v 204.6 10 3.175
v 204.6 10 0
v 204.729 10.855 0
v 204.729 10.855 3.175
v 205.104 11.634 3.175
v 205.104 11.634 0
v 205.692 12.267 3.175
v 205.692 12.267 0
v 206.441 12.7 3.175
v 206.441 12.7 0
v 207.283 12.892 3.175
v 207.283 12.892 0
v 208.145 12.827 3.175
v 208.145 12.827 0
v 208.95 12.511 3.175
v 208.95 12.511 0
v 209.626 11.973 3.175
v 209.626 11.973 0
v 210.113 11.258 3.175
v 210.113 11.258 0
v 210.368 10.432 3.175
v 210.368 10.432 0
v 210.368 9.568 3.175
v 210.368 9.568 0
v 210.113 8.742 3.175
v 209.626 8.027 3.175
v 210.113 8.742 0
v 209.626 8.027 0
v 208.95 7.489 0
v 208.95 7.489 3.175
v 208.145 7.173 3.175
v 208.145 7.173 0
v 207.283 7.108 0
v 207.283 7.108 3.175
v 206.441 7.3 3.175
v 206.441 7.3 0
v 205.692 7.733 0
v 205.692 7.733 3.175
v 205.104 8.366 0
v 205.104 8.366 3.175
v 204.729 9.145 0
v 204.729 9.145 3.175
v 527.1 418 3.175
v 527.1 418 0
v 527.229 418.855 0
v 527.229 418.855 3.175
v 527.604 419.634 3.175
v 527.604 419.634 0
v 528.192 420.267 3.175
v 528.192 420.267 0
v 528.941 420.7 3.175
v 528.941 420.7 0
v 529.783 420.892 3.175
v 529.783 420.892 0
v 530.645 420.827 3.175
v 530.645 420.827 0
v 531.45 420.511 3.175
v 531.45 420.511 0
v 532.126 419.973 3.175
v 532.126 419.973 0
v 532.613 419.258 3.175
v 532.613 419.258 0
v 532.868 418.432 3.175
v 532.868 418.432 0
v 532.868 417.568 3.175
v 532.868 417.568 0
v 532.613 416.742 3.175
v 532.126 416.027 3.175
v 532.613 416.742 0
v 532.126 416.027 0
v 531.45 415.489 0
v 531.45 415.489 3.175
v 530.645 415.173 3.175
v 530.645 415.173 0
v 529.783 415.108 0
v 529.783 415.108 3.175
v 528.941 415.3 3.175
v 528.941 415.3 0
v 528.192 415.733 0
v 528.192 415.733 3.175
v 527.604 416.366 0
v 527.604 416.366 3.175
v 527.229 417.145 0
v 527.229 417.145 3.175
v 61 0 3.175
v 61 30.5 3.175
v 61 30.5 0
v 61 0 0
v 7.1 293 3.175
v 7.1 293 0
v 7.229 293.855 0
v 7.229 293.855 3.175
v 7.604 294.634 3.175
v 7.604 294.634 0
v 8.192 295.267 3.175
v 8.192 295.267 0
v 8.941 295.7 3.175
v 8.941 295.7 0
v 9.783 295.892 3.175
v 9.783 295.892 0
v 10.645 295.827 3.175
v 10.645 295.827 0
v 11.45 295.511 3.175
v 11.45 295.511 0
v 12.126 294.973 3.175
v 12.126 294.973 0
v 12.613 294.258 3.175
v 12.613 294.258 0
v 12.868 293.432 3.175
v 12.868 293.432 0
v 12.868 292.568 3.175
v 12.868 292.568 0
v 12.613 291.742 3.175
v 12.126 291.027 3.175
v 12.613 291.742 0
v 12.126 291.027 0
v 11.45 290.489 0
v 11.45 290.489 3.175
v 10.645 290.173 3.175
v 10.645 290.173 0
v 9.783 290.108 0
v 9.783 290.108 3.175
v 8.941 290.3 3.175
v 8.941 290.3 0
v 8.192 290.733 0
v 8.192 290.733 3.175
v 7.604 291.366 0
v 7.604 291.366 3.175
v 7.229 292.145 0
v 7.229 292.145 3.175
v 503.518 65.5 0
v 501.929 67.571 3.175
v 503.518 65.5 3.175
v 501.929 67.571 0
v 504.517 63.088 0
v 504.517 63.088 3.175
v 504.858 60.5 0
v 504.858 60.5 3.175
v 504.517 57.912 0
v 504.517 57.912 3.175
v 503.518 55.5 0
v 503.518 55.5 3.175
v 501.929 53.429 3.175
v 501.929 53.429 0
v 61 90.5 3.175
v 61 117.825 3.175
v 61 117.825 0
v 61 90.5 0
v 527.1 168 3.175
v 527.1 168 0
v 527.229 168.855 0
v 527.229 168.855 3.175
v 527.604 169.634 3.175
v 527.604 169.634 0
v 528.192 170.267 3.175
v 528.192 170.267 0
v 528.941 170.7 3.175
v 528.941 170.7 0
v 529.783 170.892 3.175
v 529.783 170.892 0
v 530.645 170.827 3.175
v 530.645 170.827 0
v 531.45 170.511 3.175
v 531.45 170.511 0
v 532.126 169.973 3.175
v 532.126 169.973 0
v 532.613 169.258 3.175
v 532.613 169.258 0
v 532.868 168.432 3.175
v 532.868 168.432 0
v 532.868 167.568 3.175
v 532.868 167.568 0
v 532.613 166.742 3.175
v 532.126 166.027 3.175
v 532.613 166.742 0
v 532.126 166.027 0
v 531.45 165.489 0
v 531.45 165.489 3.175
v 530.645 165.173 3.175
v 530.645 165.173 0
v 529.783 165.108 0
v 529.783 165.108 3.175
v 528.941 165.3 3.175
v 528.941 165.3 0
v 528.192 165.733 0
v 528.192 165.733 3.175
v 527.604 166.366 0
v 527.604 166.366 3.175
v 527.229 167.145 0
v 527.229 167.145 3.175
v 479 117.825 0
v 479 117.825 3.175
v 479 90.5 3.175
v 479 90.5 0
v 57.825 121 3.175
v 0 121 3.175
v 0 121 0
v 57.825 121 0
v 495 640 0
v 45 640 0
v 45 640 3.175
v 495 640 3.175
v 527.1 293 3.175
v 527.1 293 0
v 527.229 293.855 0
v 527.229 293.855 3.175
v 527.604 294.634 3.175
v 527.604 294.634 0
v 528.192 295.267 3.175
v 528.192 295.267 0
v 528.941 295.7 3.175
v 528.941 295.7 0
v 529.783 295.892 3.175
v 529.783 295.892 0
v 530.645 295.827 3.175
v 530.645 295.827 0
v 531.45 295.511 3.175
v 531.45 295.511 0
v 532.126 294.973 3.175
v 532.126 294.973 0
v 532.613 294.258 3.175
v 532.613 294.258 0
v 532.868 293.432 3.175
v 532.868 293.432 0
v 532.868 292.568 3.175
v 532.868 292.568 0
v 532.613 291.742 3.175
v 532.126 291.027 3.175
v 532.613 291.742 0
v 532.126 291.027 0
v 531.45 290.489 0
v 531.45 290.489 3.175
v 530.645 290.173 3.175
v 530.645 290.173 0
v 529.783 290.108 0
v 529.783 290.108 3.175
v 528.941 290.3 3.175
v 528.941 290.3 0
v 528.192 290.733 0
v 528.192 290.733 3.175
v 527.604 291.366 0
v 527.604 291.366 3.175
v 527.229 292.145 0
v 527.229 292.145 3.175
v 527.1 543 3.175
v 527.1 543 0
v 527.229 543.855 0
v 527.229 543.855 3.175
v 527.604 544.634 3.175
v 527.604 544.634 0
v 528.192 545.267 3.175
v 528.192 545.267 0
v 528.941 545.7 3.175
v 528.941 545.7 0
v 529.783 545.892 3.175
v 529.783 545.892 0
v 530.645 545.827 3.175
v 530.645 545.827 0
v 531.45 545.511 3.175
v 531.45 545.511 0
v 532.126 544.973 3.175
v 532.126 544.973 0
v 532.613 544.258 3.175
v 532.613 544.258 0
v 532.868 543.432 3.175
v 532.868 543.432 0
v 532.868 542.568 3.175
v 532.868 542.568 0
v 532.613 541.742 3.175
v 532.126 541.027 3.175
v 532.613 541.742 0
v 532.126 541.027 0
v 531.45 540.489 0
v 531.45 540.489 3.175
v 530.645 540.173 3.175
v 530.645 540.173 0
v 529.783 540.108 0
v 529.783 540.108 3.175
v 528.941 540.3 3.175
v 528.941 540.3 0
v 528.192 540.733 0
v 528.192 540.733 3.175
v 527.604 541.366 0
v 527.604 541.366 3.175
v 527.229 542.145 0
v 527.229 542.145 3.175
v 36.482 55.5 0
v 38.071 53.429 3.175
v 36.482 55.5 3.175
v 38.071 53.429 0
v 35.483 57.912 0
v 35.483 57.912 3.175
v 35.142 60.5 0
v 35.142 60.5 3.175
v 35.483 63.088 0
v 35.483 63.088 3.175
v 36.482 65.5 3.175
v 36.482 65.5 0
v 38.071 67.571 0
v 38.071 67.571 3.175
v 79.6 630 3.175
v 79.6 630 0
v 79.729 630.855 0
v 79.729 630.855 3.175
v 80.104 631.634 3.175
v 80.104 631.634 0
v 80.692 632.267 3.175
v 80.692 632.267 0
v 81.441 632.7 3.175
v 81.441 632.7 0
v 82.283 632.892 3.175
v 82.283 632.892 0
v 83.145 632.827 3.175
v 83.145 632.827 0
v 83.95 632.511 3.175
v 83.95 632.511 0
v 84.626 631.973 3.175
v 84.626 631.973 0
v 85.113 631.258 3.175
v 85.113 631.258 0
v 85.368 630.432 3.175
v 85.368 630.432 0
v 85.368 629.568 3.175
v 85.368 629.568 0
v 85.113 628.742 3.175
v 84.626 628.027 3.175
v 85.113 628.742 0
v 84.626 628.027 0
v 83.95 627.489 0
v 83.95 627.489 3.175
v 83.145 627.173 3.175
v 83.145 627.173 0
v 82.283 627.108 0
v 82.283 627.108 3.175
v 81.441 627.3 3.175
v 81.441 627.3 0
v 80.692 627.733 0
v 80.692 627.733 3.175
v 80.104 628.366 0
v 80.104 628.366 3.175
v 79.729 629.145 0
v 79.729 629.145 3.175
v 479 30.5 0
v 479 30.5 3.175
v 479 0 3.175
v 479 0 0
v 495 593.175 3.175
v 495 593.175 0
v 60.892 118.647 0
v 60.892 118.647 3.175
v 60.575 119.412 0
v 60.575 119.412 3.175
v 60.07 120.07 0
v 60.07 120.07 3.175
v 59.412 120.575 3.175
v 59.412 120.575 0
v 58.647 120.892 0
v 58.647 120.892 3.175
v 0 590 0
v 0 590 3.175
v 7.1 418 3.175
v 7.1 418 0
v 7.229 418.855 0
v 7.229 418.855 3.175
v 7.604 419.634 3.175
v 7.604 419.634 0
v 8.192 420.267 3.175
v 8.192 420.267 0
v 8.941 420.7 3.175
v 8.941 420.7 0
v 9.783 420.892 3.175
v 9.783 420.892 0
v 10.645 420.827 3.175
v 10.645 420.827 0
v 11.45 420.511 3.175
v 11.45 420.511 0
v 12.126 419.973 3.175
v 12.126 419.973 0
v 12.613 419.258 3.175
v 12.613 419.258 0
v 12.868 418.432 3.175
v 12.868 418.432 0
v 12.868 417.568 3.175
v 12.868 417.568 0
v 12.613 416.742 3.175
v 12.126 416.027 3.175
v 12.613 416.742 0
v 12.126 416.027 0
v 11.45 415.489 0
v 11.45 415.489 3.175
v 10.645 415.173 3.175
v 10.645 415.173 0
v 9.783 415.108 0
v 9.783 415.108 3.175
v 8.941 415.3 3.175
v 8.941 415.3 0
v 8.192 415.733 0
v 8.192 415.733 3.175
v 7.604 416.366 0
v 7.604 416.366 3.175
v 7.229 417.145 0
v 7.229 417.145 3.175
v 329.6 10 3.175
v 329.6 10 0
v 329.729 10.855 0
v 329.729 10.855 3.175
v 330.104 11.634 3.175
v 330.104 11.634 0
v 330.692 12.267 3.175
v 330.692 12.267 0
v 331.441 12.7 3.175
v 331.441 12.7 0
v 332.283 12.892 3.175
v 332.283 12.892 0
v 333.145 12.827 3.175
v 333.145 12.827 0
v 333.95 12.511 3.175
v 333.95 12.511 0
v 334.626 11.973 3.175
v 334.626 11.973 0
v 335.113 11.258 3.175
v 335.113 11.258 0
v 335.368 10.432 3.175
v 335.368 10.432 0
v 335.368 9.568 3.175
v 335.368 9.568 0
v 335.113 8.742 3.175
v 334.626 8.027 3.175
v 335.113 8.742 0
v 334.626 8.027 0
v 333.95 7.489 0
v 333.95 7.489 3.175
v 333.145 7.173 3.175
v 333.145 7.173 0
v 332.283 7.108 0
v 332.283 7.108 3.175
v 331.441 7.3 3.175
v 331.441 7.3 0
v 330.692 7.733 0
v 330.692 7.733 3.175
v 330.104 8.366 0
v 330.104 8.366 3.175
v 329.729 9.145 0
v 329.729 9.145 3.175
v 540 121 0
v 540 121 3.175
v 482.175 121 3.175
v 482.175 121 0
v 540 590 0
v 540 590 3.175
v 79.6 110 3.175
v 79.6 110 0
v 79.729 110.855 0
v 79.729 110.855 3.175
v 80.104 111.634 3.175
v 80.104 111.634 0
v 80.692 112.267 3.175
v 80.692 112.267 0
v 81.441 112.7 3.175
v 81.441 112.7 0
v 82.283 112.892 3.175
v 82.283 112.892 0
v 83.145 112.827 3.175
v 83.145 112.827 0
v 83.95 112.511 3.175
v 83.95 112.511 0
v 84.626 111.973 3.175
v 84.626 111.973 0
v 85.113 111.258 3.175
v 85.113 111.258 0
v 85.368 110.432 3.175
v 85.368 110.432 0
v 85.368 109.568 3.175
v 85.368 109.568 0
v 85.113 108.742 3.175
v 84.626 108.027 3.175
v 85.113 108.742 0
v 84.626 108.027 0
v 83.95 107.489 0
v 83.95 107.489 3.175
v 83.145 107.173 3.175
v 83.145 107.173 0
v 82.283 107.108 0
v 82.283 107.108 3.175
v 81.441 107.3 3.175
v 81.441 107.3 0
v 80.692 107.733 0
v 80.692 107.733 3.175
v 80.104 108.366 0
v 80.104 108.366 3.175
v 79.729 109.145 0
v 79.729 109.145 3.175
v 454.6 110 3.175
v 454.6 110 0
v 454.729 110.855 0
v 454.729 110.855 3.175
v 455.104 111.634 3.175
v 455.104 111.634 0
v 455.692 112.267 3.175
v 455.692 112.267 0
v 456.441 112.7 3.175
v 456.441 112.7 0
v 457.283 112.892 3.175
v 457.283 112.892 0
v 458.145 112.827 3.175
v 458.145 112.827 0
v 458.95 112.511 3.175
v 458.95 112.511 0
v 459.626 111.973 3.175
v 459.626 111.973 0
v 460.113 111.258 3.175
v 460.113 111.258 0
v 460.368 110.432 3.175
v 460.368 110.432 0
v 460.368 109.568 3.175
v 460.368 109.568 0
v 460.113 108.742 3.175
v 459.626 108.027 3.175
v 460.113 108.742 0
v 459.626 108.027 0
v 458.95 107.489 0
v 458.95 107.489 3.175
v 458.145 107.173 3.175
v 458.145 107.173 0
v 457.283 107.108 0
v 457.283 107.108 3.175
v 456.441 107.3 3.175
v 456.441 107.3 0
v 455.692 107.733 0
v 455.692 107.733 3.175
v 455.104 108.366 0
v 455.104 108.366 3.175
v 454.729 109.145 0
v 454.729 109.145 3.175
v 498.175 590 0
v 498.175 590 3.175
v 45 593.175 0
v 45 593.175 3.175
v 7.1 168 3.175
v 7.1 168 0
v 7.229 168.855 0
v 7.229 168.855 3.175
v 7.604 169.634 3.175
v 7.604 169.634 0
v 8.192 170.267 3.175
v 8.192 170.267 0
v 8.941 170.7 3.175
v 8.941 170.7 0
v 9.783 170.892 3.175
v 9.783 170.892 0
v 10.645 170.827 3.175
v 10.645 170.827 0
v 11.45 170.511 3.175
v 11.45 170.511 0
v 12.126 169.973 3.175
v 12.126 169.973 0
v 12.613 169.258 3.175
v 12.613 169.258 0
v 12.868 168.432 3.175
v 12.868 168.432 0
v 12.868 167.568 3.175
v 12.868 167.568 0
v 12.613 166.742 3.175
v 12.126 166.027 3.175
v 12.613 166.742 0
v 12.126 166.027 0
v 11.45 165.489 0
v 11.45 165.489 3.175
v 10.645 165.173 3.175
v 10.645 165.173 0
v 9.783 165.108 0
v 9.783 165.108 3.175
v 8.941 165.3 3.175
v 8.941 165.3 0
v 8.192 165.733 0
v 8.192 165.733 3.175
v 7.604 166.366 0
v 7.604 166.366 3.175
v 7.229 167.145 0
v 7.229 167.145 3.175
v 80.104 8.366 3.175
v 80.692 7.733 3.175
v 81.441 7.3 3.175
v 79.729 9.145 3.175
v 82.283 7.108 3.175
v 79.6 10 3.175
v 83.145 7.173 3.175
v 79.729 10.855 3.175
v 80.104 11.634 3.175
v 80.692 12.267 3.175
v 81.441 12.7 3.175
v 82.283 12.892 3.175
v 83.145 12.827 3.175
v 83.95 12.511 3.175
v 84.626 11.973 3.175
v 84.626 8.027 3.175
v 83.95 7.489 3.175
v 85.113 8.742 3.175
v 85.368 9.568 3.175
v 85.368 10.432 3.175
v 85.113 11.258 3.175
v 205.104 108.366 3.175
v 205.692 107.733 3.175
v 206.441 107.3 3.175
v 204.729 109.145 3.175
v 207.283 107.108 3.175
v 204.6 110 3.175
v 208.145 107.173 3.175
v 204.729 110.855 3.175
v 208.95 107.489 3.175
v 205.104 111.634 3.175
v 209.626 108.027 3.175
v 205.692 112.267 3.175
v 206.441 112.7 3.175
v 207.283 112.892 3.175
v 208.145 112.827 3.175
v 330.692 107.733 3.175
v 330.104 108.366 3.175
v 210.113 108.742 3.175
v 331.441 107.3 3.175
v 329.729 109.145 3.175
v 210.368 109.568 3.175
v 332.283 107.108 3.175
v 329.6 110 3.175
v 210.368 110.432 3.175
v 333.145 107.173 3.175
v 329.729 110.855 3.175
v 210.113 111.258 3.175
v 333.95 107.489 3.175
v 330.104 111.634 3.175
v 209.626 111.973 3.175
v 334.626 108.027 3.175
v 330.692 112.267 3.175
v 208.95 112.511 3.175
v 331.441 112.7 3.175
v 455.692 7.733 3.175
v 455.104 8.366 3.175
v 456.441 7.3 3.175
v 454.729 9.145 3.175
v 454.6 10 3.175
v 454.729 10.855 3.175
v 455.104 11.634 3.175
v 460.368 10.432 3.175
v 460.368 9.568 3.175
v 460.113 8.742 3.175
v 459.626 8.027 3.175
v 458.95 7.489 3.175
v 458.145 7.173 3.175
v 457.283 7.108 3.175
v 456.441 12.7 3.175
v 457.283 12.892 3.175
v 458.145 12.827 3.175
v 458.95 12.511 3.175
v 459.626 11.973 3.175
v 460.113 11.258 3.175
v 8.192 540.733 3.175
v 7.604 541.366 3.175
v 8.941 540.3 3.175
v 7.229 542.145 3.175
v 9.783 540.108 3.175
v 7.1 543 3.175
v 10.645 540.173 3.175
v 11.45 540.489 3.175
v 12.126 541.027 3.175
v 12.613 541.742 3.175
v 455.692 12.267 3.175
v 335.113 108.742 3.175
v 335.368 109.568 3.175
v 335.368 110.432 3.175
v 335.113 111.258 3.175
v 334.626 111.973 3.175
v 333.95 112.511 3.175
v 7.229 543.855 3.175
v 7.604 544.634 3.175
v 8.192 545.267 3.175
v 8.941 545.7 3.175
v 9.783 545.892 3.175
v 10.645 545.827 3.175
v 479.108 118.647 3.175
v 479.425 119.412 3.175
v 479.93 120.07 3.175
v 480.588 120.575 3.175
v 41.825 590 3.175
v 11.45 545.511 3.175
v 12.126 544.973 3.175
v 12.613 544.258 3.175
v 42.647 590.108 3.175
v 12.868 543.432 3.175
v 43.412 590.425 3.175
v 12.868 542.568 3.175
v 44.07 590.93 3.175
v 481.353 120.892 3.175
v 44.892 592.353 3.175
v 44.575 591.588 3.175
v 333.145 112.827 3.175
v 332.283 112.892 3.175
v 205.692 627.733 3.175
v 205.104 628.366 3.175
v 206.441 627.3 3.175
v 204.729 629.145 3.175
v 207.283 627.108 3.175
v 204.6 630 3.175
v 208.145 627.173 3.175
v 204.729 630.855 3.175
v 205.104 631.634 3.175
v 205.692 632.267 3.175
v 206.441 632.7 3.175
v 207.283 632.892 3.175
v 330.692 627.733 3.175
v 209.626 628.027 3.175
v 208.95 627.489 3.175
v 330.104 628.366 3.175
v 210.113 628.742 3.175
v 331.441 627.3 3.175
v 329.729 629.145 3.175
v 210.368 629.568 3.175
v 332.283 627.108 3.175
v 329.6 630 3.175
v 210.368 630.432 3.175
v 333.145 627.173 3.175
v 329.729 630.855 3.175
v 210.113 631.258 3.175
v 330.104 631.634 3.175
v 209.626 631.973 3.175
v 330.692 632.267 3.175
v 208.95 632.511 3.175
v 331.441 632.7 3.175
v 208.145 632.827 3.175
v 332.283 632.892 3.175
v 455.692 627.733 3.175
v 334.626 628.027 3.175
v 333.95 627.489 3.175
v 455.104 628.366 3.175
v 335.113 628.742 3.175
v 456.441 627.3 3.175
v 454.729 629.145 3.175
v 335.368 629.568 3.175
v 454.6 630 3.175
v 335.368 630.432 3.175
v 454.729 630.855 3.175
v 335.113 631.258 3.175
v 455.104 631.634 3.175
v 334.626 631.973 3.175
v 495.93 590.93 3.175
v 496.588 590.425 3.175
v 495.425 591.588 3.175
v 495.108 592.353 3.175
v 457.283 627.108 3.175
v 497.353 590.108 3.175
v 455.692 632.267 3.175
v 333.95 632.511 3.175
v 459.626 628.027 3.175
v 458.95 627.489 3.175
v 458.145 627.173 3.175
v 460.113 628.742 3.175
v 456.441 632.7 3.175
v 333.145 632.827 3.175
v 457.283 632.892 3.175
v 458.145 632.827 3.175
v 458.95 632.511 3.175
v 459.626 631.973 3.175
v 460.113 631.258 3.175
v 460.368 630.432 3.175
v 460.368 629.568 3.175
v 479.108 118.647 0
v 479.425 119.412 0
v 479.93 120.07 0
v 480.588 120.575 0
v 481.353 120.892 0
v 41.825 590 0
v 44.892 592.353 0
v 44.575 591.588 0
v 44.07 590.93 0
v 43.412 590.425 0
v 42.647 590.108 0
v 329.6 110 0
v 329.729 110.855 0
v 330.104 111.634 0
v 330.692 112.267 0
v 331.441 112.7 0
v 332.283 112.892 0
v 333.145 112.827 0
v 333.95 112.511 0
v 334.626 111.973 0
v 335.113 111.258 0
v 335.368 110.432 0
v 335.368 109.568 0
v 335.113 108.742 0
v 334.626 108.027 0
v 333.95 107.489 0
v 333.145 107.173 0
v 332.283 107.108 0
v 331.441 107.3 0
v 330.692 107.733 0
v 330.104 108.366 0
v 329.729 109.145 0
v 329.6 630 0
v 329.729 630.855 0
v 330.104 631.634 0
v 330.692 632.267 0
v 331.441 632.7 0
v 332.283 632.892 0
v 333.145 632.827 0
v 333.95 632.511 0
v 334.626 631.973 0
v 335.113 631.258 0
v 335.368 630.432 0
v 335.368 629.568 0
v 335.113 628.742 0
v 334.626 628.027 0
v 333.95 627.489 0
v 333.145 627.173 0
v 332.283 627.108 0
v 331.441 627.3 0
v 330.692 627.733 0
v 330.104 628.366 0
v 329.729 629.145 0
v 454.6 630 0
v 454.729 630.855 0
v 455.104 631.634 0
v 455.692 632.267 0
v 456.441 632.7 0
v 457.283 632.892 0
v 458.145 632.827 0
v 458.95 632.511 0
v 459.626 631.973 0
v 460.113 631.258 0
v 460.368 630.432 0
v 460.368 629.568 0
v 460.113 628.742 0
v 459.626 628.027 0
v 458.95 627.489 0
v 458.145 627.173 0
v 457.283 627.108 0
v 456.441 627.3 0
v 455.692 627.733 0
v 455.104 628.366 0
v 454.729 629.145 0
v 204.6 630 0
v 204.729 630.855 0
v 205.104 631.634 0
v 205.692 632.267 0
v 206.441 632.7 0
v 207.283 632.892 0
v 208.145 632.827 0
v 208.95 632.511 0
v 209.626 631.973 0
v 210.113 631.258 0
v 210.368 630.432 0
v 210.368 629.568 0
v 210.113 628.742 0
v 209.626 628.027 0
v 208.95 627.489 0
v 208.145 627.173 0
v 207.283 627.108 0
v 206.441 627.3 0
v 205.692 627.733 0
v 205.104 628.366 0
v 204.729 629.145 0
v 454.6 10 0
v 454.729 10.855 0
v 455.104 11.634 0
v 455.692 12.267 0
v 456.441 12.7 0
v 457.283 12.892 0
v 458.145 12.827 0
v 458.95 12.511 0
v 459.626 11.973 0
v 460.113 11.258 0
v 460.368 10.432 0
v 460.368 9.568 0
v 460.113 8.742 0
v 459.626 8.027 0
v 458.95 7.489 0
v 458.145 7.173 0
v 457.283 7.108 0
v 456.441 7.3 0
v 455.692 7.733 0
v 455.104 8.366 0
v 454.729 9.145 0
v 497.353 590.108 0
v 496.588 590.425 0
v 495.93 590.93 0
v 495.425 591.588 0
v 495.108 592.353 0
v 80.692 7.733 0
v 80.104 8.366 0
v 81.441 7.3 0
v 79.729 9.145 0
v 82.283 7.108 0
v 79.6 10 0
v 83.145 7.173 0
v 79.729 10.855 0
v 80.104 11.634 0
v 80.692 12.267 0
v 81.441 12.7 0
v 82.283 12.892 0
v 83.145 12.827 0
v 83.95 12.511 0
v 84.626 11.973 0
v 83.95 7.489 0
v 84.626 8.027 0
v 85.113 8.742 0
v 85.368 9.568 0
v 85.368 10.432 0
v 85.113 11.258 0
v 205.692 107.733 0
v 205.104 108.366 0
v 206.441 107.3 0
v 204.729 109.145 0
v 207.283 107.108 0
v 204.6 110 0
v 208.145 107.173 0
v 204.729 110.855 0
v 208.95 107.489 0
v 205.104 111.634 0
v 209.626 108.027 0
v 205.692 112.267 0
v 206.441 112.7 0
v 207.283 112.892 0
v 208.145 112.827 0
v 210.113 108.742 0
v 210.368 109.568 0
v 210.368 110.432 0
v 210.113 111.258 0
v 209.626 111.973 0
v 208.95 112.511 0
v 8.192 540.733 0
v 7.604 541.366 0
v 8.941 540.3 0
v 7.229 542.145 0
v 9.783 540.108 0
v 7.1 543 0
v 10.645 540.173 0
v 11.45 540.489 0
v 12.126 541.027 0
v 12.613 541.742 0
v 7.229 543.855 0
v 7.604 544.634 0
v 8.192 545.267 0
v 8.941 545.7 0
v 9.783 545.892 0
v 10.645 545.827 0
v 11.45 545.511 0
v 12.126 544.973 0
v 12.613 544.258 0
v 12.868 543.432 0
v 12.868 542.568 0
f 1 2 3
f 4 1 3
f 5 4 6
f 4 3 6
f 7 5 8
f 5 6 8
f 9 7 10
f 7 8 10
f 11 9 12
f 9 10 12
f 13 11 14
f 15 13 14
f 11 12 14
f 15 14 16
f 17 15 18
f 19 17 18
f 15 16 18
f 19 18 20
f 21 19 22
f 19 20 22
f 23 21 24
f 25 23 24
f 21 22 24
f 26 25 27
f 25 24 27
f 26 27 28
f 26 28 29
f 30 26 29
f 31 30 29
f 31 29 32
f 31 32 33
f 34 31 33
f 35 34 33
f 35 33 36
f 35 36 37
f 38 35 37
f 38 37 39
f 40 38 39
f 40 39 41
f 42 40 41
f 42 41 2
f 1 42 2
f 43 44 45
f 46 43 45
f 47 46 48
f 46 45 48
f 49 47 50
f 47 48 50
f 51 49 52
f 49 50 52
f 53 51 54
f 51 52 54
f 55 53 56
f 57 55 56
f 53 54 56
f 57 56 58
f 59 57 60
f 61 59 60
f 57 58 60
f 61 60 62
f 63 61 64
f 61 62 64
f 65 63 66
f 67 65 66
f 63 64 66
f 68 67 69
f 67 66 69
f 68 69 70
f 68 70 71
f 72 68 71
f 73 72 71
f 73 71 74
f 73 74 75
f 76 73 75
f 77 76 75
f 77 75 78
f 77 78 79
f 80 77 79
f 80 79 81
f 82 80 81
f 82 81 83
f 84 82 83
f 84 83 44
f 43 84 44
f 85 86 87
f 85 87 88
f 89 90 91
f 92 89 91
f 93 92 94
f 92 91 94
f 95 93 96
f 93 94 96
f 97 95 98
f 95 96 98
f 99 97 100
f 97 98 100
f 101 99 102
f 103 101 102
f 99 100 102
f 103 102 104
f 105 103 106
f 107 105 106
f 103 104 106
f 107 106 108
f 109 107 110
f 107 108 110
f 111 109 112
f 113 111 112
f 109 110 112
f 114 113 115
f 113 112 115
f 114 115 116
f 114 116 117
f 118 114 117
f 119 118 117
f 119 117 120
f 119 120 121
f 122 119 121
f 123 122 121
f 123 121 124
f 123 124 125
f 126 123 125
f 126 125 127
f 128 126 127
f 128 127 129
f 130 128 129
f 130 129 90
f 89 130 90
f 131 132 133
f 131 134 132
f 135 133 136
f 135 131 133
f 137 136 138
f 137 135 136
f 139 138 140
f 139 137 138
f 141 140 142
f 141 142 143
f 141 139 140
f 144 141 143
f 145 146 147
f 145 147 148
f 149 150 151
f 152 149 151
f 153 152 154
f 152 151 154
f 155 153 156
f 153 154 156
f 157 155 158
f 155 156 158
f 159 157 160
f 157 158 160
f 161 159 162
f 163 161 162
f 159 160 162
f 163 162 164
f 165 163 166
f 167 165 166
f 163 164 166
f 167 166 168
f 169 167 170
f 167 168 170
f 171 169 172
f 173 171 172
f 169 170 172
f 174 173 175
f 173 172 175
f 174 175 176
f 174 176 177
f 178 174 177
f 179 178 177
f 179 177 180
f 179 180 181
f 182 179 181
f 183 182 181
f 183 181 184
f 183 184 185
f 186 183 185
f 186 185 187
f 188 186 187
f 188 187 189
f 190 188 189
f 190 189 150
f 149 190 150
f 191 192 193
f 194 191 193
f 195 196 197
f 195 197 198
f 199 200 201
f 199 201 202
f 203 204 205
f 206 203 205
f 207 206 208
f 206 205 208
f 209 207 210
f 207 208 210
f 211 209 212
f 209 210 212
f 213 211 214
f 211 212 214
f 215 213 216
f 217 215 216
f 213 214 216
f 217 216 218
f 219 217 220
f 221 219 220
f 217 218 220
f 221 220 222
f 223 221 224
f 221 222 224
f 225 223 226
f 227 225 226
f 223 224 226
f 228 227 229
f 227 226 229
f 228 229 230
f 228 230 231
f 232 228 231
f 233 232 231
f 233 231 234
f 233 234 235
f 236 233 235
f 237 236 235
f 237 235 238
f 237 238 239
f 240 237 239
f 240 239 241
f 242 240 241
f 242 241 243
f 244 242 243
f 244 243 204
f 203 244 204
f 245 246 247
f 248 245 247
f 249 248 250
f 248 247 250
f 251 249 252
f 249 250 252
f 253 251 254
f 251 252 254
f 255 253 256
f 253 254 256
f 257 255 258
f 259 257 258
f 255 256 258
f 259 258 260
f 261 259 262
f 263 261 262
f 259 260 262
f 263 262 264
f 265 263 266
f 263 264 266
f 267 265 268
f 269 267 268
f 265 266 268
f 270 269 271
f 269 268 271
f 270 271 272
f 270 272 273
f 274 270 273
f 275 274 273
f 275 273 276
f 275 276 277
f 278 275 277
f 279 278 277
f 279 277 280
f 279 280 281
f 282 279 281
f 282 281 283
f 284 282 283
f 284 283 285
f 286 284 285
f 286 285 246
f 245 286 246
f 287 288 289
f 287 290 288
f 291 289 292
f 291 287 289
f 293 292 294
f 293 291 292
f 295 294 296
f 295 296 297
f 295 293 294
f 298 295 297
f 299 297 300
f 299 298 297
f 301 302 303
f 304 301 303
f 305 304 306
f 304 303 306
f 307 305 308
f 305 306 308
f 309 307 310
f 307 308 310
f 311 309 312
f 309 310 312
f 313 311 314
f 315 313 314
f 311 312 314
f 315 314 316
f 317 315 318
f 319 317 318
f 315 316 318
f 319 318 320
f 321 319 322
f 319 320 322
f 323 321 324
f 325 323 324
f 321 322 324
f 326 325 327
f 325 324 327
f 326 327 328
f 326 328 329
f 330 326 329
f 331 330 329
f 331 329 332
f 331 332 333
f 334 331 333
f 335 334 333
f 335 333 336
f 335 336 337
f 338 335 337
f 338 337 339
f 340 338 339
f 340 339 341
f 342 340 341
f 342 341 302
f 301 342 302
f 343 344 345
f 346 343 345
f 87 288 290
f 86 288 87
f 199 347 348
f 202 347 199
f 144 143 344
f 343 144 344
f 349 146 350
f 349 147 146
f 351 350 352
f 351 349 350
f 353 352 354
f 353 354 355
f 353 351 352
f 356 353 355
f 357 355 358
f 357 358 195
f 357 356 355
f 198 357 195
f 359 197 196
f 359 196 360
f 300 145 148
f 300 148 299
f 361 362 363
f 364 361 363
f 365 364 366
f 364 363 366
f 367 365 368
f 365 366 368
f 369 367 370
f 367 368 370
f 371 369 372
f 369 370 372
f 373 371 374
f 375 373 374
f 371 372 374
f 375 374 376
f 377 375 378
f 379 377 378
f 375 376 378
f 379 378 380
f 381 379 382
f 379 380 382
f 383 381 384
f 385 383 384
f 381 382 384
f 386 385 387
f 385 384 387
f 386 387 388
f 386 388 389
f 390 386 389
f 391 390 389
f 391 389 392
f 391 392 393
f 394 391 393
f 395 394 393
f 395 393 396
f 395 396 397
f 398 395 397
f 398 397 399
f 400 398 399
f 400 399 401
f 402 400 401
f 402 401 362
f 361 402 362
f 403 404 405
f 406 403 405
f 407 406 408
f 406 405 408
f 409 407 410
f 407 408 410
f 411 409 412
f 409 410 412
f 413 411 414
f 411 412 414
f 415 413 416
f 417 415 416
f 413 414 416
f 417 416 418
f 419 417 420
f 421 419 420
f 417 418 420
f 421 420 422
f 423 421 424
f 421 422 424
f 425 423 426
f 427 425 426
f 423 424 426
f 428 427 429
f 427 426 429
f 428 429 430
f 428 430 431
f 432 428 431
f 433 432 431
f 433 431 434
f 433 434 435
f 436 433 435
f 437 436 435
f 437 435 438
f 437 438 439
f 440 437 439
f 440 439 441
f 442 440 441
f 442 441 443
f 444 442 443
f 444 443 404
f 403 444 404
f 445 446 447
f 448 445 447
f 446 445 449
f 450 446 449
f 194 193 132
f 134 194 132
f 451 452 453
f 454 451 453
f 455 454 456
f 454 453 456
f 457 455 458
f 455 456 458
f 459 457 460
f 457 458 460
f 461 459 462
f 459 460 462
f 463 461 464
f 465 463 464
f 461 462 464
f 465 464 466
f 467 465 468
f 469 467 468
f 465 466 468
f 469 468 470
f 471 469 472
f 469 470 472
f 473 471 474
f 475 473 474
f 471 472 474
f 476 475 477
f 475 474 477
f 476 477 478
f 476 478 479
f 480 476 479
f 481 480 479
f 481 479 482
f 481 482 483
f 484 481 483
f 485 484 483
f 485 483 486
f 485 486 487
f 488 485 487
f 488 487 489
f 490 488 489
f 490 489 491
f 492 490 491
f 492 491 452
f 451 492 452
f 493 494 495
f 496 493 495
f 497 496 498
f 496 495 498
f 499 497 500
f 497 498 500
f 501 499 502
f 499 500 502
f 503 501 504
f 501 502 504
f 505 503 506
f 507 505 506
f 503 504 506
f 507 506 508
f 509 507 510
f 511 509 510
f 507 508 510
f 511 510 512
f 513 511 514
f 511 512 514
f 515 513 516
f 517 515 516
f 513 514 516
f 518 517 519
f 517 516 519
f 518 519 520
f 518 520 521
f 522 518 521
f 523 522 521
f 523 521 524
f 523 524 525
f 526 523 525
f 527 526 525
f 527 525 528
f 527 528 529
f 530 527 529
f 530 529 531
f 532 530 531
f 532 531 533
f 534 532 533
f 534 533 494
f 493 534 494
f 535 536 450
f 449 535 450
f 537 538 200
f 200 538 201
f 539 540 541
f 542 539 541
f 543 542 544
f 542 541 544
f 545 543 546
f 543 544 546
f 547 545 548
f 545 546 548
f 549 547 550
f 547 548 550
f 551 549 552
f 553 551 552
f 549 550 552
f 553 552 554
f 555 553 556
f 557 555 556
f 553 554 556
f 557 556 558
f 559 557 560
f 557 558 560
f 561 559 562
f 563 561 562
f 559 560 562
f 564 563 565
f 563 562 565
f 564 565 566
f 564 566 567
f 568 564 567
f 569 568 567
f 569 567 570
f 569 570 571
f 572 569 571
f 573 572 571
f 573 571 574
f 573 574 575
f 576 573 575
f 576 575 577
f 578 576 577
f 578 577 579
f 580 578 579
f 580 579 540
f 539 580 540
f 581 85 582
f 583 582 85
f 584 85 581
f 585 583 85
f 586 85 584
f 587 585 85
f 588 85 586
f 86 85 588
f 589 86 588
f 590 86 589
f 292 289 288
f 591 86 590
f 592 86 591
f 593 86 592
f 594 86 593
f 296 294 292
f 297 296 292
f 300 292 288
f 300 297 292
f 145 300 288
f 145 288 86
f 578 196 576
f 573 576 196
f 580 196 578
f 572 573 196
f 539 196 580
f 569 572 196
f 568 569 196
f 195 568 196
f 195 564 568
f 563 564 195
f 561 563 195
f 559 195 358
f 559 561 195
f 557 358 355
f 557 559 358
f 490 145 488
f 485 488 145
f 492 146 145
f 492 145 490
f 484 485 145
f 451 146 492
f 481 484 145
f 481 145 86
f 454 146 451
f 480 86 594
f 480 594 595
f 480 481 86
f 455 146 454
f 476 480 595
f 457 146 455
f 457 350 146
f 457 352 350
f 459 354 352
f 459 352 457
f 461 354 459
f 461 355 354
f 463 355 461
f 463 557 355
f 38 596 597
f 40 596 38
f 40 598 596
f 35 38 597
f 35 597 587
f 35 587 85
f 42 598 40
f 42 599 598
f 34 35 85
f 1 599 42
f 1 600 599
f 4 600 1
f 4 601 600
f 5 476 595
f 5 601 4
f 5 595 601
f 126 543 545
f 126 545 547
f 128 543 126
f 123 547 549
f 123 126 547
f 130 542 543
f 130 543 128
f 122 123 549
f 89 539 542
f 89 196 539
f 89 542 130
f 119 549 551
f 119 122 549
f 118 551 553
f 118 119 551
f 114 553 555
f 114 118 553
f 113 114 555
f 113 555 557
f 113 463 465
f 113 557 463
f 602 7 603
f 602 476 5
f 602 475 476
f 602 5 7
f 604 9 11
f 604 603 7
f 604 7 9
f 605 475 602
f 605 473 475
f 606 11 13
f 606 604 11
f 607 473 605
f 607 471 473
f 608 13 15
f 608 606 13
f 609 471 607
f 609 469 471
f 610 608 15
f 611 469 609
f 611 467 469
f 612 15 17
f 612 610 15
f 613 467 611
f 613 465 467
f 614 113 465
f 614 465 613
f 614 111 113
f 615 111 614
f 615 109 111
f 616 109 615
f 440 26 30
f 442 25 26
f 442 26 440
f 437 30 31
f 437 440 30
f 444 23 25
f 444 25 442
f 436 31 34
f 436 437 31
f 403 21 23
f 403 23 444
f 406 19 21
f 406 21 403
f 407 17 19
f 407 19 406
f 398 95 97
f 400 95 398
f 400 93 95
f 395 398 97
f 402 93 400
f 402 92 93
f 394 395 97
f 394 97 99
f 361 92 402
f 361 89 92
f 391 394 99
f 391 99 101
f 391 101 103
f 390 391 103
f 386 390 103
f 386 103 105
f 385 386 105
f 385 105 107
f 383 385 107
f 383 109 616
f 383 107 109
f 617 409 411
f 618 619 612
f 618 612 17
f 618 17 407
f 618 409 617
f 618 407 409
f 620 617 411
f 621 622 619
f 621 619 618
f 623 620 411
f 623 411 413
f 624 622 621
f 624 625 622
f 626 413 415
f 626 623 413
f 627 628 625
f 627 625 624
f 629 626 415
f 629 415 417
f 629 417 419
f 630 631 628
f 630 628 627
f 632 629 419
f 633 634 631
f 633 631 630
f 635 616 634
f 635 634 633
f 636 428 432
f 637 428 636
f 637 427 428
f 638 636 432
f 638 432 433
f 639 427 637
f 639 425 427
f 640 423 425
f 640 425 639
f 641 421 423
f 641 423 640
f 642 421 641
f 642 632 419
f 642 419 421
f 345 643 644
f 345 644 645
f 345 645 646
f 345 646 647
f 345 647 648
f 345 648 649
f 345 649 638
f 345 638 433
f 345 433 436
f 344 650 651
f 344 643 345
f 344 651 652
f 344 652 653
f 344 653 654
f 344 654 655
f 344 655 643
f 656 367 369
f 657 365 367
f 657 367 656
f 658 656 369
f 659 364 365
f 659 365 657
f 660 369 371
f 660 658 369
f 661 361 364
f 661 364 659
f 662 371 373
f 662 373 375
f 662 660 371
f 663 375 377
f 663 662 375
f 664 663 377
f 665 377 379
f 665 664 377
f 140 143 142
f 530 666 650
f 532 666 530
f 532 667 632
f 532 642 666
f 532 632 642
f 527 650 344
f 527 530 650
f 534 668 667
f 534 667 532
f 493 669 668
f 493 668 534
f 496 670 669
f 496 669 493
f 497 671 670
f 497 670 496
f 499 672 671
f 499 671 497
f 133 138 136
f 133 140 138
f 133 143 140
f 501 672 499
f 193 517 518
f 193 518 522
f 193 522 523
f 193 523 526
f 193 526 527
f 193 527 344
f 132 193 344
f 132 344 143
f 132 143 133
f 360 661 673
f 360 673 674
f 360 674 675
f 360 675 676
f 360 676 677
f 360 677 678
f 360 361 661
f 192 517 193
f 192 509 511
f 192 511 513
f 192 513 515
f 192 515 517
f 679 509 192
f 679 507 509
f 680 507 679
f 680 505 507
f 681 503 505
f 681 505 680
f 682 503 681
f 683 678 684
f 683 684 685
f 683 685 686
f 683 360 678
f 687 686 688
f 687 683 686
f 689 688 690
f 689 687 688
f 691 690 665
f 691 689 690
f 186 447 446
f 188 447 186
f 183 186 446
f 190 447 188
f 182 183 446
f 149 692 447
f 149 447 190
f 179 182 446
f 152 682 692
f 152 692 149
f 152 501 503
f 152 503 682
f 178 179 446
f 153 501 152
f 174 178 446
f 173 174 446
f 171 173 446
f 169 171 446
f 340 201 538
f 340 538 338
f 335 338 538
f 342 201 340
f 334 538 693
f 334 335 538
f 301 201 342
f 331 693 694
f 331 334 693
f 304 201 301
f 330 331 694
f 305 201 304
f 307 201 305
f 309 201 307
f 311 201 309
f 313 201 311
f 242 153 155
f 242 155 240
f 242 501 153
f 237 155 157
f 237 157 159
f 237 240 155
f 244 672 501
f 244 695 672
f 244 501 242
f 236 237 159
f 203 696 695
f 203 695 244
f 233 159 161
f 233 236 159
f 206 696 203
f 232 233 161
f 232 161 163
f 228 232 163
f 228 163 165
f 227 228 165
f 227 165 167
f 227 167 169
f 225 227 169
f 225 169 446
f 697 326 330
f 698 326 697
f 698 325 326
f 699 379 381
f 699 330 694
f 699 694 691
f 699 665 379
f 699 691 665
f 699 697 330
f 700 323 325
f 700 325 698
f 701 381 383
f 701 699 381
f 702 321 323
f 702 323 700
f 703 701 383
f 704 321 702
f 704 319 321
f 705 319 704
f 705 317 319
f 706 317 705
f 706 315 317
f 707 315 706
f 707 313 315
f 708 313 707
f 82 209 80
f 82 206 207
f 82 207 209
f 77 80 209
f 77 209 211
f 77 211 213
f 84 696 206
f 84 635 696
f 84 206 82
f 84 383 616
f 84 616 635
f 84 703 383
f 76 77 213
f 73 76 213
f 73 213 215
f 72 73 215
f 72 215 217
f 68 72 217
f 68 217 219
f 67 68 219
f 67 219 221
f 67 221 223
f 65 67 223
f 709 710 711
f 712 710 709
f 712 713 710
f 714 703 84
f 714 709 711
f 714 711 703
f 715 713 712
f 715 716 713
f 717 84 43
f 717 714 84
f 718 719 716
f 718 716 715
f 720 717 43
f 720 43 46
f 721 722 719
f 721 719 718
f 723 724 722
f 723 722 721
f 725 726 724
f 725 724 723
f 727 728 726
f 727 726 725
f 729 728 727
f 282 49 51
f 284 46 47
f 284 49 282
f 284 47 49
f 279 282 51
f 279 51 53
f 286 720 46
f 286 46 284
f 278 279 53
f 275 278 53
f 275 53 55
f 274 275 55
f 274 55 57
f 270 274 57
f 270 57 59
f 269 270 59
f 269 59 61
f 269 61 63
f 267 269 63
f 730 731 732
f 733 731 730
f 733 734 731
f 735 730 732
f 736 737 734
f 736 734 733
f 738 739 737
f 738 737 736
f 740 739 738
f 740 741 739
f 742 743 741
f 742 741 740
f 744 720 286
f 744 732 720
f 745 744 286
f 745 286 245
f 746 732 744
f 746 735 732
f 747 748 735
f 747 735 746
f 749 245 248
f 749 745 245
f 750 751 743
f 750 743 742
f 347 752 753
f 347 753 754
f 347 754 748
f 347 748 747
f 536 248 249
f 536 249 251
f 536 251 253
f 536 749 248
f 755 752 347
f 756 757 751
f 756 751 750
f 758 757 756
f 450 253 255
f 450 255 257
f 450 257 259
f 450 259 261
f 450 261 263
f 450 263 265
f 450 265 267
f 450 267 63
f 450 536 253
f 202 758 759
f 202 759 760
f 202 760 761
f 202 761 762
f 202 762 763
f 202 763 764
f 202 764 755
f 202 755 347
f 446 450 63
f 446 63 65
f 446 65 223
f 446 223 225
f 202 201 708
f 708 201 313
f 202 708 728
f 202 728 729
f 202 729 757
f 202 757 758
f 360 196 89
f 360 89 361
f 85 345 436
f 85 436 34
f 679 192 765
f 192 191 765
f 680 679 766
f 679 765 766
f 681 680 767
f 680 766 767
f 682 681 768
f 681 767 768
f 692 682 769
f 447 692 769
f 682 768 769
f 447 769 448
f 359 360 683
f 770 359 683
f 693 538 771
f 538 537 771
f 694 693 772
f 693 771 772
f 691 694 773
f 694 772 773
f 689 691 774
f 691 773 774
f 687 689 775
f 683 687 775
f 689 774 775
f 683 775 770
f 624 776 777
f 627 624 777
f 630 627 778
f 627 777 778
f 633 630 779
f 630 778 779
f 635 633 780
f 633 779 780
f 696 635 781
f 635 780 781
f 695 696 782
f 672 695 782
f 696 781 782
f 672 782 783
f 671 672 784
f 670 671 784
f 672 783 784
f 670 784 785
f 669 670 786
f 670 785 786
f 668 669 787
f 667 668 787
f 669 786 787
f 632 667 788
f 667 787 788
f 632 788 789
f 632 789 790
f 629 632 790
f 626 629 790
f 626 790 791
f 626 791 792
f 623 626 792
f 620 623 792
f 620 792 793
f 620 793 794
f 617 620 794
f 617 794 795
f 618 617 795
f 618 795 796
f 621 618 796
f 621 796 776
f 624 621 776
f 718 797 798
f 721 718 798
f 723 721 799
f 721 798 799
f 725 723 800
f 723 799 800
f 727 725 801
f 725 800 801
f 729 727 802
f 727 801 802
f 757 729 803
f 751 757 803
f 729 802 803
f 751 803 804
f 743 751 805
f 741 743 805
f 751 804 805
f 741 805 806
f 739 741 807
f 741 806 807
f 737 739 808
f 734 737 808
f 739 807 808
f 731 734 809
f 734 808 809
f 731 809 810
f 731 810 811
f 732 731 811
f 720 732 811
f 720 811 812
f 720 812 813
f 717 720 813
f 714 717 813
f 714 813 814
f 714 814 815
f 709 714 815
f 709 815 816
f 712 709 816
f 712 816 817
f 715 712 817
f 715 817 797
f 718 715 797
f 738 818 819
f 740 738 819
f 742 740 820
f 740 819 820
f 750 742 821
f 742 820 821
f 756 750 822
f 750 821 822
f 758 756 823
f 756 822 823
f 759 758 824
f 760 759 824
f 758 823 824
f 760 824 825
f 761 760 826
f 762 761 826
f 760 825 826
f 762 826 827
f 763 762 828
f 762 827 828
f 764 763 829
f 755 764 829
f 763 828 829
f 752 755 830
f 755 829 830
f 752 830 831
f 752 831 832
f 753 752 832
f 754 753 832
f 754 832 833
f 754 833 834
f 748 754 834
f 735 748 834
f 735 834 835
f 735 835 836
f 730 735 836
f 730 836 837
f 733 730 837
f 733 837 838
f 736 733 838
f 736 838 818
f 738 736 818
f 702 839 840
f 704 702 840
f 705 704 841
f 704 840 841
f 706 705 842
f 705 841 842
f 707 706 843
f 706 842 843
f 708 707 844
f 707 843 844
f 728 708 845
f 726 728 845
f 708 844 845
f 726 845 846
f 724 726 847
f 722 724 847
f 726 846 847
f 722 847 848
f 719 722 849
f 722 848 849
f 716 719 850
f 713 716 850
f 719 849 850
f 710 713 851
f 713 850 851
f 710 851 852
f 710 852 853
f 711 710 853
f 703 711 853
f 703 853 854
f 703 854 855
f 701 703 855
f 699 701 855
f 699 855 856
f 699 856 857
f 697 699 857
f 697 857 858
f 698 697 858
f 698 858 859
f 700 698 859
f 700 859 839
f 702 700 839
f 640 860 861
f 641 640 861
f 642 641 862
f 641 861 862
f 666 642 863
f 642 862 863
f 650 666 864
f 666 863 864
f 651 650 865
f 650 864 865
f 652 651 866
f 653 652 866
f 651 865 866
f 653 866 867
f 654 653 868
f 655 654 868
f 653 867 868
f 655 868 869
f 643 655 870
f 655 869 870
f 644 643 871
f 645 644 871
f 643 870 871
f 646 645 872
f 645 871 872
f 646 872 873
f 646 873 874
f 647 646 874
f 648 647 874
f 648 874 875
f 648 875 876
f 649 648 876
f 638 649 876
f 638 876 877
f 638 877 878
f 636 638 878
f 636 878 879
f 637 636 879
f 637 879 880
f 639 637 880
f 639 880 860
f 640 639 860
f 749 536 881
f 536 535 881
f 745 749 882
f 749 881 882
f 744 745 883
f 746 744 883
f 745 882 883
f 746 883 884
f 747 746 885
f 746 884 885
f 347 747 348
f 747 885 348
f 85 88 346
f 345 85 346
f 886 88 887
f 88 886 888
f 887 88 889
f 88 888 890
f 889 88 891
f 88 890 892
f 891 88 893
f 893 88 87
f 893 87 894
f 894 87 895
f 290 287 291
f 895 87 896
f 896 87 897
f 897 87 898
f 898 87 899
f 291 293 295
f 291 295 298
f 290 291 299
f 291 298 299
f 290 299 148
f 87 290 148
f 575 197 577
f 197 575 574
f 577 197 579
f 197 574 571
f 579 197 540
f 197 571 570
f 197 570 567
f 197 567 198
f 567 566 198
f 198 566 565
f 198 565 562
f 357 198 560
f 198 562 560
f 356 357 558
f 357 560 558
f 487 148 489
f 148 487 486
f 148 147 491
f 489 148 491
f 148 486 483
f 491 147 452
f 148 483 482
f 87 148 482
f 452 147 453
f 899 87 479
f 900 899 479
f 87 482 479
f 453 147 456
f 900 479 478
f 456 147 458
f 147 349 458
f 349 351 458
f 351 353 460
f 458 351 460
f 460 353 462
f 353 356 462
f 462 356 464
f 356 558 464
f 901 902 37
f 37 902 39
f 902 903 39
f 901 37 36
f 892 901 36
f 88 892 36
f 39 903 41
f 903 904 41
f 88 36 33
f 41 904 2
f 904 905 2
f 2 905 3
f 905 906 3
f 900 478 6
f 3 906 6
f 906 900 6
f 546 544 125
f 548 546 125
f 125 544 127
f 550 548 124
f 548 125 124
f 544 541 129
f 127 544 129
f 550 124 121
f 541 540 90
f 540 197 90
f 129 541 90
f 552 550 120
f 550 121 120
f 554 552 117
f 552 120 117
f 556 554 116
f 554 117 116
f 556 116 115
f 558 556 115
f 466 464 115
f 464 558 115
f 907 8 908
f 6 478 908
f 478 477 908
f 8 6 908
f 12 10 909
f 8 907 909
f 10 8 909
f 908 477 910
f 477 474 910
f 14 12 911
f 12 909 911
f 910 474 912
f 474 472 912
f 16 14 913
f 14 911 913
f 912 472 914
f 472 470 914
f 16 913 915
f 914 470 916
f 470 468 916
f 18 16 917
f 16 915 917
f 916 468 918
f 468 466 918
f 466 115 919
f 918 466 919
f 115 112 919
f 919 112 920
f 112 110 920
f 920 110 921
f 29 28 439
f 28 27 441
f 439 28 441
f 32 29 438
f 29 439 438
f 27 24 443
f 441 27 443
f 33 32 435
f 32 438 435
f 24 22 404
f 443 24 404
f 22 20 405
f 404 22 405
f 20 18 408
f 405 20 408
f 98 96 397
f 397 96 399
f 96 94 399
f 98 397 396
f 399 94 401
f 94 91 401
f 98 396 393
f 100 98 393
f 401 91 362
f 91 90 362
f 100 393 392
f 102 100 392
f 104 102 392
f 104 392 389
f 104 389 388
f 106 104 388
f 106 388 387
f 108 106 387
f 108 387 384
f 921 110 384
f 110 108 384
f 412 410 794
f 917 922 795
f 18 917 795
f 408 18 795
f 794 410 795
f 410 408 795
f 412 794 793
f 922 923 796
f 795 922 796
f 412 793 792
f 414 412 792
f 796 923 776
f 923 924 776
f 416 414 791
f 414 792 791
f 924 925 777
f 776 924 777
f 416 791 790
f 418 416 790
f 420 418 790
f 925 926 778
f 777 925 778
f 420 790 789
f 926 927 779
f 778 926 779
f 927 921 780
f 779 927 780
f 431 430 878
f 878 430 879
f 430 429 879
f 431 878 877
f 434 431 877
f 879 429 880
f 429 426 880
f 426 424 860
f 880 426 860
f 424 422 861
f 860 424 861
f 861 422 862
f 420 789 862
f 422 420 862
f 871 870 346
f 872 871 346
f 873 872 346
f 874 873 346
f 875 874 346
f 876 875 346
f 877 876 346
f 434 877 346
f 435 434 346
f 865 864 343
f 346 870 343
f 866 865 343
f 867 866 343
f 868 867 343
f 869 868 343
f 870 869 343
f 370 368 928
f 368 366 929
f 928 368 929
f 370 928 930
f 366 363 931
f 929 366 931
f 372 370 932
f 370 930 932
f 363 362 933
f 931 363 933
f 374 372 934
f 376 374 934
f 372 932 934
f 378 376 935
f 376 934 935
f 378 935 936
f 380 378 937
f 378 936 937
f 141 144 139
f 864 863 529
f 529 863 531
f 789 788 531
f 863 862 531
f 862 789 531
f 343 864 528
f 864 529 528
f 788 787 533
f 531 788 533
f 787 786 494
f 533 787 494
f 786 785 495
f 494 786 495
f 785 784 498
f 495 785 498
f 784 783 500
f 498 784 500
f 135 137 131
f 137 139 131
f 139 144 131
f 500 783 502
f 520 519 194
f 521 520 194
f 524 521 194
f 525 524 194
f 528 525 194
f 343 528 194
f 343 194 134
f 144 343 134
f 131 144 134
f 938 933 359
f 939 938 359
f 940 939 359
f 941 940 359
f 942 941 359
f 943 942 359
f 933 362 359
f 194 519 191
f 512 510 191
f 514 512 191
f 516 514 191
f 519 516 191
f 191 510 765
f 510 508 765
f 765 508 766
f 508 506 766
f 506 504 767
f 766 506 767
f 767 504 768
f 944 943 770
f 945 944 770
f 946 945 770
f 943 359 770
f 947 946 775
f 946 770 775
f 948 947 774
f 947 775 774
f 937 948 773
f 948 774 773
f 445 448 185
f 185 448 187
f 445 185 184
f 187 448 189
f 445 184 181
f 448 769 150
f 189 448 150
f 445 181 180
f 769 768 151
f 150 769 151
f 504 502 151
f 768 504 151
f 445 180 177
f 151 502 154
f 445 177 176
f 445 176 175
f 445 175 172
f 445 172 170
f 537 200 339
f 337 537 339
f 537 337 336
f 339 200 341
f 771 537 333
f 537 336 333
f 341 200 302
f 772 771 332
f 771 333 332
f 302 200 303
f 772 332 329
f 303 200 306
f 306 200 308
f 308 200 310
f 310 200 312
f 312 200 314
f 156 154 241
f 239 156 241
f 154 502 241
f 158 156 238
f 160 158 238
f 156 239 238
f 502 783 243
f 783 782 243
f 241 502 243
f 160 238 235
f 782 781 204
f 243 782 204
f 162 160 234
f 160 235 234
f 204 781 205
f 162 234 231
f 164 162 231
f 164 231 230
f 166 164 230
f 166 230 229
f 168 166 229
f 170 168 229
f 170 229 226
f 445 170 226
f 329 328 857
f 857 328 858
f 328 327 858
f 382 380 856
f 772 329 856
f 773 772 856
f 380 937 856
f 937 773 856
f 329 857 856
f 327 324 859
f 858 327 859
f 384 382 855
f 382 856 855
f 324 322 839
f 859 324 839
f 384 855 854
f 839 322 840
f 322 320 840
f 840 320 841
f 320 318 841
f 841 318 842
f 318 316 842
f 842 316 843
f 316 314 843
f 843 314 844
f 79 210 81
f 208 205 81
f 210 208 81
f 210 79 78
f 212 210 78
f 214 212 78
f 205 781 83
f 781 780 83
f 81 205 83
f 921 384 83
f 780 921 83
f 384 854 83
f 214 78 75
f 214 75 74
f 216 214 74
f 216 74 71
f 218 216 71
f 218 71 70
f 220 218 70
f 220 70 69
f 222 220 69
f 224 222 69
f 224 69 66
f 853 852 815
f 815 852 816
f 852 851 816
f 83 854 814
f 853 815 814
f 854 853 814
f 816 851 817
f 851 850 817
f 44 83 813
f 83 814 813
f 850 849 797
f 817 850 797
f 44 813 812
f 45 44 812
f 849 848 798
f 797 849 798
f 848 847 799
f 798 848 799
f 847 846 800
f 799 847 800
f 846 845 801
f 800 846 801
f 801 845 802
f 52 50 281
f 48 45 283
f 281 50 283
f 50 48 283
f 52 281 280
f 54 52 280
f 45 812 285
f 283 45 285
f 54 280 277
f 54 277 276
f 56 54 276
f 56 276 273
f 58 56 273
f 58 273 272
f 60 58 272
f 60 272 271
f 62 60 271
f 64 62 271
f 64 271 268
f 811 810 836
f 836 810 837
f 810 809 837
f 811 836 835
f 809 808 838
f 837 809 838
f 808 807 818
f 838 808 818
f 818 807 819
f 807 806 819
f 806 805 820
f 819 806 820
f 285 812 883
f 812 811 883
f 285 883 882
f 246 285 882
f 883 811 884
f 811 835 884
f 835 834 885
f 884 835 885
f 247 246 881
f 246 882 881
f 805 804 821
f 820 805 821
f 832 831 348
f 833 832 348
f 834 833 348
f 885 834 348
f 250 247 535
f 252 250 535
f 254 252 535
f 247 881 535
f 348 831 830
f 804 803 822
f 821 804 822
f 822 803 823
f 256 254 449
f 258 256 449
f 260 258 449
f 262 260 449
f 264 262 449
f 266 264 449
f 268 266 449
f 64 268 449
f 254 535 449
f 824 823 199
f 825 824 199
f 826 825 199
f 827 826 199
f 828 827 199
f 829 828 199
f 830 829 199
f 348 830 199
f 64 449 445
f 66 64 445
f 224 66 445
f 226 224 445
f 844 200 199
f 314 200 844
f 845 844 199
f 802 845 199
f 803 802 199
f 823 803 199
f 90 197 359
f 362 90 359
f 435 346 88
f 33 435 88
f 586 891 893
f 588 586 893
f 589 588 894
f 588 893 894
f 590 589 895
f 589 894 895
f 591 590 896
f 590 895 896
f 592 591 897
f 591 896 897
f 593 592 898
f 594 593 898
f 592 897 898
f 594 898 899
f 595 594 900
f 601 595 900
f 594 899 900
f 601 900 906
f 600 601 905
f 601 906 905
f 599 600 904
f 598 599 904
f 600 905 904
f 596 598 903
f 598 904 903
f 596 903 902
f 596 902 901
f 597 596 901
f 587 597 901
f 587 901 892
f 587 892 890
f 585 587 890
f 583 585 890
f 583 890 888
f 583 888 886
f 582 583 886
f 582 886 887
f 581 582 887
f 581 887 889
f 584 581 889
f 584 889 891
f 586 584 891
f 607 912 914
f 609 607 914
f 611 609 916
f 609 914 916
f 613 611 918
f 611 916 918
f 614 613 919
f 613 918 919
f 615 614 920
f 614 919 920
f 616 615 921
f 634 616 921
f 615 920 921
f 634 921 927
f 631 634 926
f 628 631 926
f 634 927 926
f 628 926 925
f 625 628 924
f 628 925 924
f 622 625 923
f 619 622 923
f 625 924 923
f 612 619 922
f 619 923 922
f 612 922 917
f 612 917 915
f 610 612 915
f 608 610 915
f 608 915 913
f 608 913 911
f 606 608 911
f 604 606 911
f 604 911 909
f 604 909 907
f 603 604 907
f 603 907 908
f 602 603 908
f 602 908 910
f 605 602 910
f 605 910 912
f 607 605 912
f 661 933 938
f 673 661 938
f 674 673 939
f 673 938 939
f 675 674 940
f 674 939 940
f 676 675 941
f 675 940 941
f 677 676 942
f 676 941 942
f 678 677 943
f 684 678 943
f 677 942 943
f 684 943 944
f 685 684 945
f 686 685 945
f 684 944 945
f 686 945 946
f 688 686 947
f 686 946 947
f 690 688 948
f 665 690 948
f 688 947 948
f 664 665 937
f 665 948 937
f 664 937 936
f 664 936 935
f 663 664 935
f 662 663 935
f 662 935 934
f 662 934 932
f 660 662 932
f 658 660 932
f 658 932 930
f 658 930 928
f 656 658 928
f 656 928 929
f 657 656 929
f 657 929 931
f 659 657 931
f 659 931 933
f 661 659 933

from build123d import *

# Parameters (mm, degrees)
SKETCH2_W            = 540
SKETCH2_H            = 640
BOSS_EXTRUDE1_DEPTH  = 3.175
SKETCH3_W            = 45
SKETCH3_H            = 50
CUT_EXTRUDE1_DEPTH   = 838.382875765
FILLET1_R            = 10
FILLET2_R            = 3.175
M5_CLEARANCE_HOLE1_D = 5.8
LPATTERN1_COUNT      = 4
LPATTERN1_PITCH      = 125
M5_CLEARANCE_HOLE2_D = 5.8
LPATTERN2_COUNT      = 4
LPATTERN2_PITCH      = 125


with BuildPart() as part:
    # Sketch2 → Boss-Extrude1 (new body)
    with BuildSketch(Plane.XY):
        with Locations((270, 320)):
            Rectangle(SKETCH2_W, SKETCH2_H)
    extrude(amount=BOSS_EXTRUDE1_DEPTH)

    # Sketch3 → Cut-Extrude1 (cut, through all)
    with BuildSketch(Plane.XY.offset(3.175)):
        with Locations((22.5, 615)):
            Rectangle(SKETCH3_W, SKETCH3_H)
        Polygon((0, 121), (61, 121), (61, 90.5), (31, 60.5), (61, 30.5), (61, 0), (0, 0), align=None)
        Polygon((540, 0), (540, 121), (479, 121), (479, 90.5), (509, 60.5), (479, 30.5), (479, 0), align=None)
        with Locations((517.5, 615)):
            Rectangle(SKETCH3_W, SKETCH3_H)
    extrude(amount=-CUT_EXTRUDE1_DEPTH, mode=Mode.SUBTRACT)

    # Fillet1
    fillet1_edges = [part.edges().sort_by_distance(p)[0] for p in [
        (31, 60.5, 1.5875),
        (509, 60.5, 1.5875),
    ]]
    fillet(fillet1_edges, radius=FILLET1_R)

    # Fillet2
    fillet2_edges = [part.edges().sort_by_distance(p)[0] for p in [
        (45, 590, 1.5875),
        (61, 121, 1.5875),
        (479, 121, 1.5875),
        (495, 590, 1.5875),
    ]]
    fillet(fillet2_edges, radius=FILLET2_R)

    # M5 Clearance Hole1 (through all)
    with Locations(Plane(origin=(82.5, 10, 3.175), x_dir=(1, 0, 0), z_dir=(0, 0, 1))):
        with Locations((0, 0), (0, 100), (0, 620)):
            m5_clearance_hole1 = Hole(M5_CLEARANCE_HOLE1_D / 2)

    # LPattern1: M5 Clearance Hole1 ×4
    with Locations(*[(i * LPATTERN1_PITCH, 0, 0) for i in range(1, LPATTERN1_COUNT)]):
        add(m5_clearance_hole1, mode=Mode.SUBTRACT)

    # M5 Clearance Hole2 (through all)
    with Locations(Plane(origin=(10, 168, 3.175), x_dir=(1, 0, 0), z_dir=(0, 0, 1))):
        with Locations((0, 0), (520, 0)):
            m5_clearance_hole2 = Hole(M5_CLEARANCE_HOLE2_D / 2)

    # LPattern2: M5 Clearance Hole2 ×4
    with Locations(*[(0, i * LPATTERN2_PITCH, 0) for i in range(1, LPATTERN2_COUNT)]):
        add(m5_clearance_hole2, mode=Mode.SUBTRACT)


solid = part.part
